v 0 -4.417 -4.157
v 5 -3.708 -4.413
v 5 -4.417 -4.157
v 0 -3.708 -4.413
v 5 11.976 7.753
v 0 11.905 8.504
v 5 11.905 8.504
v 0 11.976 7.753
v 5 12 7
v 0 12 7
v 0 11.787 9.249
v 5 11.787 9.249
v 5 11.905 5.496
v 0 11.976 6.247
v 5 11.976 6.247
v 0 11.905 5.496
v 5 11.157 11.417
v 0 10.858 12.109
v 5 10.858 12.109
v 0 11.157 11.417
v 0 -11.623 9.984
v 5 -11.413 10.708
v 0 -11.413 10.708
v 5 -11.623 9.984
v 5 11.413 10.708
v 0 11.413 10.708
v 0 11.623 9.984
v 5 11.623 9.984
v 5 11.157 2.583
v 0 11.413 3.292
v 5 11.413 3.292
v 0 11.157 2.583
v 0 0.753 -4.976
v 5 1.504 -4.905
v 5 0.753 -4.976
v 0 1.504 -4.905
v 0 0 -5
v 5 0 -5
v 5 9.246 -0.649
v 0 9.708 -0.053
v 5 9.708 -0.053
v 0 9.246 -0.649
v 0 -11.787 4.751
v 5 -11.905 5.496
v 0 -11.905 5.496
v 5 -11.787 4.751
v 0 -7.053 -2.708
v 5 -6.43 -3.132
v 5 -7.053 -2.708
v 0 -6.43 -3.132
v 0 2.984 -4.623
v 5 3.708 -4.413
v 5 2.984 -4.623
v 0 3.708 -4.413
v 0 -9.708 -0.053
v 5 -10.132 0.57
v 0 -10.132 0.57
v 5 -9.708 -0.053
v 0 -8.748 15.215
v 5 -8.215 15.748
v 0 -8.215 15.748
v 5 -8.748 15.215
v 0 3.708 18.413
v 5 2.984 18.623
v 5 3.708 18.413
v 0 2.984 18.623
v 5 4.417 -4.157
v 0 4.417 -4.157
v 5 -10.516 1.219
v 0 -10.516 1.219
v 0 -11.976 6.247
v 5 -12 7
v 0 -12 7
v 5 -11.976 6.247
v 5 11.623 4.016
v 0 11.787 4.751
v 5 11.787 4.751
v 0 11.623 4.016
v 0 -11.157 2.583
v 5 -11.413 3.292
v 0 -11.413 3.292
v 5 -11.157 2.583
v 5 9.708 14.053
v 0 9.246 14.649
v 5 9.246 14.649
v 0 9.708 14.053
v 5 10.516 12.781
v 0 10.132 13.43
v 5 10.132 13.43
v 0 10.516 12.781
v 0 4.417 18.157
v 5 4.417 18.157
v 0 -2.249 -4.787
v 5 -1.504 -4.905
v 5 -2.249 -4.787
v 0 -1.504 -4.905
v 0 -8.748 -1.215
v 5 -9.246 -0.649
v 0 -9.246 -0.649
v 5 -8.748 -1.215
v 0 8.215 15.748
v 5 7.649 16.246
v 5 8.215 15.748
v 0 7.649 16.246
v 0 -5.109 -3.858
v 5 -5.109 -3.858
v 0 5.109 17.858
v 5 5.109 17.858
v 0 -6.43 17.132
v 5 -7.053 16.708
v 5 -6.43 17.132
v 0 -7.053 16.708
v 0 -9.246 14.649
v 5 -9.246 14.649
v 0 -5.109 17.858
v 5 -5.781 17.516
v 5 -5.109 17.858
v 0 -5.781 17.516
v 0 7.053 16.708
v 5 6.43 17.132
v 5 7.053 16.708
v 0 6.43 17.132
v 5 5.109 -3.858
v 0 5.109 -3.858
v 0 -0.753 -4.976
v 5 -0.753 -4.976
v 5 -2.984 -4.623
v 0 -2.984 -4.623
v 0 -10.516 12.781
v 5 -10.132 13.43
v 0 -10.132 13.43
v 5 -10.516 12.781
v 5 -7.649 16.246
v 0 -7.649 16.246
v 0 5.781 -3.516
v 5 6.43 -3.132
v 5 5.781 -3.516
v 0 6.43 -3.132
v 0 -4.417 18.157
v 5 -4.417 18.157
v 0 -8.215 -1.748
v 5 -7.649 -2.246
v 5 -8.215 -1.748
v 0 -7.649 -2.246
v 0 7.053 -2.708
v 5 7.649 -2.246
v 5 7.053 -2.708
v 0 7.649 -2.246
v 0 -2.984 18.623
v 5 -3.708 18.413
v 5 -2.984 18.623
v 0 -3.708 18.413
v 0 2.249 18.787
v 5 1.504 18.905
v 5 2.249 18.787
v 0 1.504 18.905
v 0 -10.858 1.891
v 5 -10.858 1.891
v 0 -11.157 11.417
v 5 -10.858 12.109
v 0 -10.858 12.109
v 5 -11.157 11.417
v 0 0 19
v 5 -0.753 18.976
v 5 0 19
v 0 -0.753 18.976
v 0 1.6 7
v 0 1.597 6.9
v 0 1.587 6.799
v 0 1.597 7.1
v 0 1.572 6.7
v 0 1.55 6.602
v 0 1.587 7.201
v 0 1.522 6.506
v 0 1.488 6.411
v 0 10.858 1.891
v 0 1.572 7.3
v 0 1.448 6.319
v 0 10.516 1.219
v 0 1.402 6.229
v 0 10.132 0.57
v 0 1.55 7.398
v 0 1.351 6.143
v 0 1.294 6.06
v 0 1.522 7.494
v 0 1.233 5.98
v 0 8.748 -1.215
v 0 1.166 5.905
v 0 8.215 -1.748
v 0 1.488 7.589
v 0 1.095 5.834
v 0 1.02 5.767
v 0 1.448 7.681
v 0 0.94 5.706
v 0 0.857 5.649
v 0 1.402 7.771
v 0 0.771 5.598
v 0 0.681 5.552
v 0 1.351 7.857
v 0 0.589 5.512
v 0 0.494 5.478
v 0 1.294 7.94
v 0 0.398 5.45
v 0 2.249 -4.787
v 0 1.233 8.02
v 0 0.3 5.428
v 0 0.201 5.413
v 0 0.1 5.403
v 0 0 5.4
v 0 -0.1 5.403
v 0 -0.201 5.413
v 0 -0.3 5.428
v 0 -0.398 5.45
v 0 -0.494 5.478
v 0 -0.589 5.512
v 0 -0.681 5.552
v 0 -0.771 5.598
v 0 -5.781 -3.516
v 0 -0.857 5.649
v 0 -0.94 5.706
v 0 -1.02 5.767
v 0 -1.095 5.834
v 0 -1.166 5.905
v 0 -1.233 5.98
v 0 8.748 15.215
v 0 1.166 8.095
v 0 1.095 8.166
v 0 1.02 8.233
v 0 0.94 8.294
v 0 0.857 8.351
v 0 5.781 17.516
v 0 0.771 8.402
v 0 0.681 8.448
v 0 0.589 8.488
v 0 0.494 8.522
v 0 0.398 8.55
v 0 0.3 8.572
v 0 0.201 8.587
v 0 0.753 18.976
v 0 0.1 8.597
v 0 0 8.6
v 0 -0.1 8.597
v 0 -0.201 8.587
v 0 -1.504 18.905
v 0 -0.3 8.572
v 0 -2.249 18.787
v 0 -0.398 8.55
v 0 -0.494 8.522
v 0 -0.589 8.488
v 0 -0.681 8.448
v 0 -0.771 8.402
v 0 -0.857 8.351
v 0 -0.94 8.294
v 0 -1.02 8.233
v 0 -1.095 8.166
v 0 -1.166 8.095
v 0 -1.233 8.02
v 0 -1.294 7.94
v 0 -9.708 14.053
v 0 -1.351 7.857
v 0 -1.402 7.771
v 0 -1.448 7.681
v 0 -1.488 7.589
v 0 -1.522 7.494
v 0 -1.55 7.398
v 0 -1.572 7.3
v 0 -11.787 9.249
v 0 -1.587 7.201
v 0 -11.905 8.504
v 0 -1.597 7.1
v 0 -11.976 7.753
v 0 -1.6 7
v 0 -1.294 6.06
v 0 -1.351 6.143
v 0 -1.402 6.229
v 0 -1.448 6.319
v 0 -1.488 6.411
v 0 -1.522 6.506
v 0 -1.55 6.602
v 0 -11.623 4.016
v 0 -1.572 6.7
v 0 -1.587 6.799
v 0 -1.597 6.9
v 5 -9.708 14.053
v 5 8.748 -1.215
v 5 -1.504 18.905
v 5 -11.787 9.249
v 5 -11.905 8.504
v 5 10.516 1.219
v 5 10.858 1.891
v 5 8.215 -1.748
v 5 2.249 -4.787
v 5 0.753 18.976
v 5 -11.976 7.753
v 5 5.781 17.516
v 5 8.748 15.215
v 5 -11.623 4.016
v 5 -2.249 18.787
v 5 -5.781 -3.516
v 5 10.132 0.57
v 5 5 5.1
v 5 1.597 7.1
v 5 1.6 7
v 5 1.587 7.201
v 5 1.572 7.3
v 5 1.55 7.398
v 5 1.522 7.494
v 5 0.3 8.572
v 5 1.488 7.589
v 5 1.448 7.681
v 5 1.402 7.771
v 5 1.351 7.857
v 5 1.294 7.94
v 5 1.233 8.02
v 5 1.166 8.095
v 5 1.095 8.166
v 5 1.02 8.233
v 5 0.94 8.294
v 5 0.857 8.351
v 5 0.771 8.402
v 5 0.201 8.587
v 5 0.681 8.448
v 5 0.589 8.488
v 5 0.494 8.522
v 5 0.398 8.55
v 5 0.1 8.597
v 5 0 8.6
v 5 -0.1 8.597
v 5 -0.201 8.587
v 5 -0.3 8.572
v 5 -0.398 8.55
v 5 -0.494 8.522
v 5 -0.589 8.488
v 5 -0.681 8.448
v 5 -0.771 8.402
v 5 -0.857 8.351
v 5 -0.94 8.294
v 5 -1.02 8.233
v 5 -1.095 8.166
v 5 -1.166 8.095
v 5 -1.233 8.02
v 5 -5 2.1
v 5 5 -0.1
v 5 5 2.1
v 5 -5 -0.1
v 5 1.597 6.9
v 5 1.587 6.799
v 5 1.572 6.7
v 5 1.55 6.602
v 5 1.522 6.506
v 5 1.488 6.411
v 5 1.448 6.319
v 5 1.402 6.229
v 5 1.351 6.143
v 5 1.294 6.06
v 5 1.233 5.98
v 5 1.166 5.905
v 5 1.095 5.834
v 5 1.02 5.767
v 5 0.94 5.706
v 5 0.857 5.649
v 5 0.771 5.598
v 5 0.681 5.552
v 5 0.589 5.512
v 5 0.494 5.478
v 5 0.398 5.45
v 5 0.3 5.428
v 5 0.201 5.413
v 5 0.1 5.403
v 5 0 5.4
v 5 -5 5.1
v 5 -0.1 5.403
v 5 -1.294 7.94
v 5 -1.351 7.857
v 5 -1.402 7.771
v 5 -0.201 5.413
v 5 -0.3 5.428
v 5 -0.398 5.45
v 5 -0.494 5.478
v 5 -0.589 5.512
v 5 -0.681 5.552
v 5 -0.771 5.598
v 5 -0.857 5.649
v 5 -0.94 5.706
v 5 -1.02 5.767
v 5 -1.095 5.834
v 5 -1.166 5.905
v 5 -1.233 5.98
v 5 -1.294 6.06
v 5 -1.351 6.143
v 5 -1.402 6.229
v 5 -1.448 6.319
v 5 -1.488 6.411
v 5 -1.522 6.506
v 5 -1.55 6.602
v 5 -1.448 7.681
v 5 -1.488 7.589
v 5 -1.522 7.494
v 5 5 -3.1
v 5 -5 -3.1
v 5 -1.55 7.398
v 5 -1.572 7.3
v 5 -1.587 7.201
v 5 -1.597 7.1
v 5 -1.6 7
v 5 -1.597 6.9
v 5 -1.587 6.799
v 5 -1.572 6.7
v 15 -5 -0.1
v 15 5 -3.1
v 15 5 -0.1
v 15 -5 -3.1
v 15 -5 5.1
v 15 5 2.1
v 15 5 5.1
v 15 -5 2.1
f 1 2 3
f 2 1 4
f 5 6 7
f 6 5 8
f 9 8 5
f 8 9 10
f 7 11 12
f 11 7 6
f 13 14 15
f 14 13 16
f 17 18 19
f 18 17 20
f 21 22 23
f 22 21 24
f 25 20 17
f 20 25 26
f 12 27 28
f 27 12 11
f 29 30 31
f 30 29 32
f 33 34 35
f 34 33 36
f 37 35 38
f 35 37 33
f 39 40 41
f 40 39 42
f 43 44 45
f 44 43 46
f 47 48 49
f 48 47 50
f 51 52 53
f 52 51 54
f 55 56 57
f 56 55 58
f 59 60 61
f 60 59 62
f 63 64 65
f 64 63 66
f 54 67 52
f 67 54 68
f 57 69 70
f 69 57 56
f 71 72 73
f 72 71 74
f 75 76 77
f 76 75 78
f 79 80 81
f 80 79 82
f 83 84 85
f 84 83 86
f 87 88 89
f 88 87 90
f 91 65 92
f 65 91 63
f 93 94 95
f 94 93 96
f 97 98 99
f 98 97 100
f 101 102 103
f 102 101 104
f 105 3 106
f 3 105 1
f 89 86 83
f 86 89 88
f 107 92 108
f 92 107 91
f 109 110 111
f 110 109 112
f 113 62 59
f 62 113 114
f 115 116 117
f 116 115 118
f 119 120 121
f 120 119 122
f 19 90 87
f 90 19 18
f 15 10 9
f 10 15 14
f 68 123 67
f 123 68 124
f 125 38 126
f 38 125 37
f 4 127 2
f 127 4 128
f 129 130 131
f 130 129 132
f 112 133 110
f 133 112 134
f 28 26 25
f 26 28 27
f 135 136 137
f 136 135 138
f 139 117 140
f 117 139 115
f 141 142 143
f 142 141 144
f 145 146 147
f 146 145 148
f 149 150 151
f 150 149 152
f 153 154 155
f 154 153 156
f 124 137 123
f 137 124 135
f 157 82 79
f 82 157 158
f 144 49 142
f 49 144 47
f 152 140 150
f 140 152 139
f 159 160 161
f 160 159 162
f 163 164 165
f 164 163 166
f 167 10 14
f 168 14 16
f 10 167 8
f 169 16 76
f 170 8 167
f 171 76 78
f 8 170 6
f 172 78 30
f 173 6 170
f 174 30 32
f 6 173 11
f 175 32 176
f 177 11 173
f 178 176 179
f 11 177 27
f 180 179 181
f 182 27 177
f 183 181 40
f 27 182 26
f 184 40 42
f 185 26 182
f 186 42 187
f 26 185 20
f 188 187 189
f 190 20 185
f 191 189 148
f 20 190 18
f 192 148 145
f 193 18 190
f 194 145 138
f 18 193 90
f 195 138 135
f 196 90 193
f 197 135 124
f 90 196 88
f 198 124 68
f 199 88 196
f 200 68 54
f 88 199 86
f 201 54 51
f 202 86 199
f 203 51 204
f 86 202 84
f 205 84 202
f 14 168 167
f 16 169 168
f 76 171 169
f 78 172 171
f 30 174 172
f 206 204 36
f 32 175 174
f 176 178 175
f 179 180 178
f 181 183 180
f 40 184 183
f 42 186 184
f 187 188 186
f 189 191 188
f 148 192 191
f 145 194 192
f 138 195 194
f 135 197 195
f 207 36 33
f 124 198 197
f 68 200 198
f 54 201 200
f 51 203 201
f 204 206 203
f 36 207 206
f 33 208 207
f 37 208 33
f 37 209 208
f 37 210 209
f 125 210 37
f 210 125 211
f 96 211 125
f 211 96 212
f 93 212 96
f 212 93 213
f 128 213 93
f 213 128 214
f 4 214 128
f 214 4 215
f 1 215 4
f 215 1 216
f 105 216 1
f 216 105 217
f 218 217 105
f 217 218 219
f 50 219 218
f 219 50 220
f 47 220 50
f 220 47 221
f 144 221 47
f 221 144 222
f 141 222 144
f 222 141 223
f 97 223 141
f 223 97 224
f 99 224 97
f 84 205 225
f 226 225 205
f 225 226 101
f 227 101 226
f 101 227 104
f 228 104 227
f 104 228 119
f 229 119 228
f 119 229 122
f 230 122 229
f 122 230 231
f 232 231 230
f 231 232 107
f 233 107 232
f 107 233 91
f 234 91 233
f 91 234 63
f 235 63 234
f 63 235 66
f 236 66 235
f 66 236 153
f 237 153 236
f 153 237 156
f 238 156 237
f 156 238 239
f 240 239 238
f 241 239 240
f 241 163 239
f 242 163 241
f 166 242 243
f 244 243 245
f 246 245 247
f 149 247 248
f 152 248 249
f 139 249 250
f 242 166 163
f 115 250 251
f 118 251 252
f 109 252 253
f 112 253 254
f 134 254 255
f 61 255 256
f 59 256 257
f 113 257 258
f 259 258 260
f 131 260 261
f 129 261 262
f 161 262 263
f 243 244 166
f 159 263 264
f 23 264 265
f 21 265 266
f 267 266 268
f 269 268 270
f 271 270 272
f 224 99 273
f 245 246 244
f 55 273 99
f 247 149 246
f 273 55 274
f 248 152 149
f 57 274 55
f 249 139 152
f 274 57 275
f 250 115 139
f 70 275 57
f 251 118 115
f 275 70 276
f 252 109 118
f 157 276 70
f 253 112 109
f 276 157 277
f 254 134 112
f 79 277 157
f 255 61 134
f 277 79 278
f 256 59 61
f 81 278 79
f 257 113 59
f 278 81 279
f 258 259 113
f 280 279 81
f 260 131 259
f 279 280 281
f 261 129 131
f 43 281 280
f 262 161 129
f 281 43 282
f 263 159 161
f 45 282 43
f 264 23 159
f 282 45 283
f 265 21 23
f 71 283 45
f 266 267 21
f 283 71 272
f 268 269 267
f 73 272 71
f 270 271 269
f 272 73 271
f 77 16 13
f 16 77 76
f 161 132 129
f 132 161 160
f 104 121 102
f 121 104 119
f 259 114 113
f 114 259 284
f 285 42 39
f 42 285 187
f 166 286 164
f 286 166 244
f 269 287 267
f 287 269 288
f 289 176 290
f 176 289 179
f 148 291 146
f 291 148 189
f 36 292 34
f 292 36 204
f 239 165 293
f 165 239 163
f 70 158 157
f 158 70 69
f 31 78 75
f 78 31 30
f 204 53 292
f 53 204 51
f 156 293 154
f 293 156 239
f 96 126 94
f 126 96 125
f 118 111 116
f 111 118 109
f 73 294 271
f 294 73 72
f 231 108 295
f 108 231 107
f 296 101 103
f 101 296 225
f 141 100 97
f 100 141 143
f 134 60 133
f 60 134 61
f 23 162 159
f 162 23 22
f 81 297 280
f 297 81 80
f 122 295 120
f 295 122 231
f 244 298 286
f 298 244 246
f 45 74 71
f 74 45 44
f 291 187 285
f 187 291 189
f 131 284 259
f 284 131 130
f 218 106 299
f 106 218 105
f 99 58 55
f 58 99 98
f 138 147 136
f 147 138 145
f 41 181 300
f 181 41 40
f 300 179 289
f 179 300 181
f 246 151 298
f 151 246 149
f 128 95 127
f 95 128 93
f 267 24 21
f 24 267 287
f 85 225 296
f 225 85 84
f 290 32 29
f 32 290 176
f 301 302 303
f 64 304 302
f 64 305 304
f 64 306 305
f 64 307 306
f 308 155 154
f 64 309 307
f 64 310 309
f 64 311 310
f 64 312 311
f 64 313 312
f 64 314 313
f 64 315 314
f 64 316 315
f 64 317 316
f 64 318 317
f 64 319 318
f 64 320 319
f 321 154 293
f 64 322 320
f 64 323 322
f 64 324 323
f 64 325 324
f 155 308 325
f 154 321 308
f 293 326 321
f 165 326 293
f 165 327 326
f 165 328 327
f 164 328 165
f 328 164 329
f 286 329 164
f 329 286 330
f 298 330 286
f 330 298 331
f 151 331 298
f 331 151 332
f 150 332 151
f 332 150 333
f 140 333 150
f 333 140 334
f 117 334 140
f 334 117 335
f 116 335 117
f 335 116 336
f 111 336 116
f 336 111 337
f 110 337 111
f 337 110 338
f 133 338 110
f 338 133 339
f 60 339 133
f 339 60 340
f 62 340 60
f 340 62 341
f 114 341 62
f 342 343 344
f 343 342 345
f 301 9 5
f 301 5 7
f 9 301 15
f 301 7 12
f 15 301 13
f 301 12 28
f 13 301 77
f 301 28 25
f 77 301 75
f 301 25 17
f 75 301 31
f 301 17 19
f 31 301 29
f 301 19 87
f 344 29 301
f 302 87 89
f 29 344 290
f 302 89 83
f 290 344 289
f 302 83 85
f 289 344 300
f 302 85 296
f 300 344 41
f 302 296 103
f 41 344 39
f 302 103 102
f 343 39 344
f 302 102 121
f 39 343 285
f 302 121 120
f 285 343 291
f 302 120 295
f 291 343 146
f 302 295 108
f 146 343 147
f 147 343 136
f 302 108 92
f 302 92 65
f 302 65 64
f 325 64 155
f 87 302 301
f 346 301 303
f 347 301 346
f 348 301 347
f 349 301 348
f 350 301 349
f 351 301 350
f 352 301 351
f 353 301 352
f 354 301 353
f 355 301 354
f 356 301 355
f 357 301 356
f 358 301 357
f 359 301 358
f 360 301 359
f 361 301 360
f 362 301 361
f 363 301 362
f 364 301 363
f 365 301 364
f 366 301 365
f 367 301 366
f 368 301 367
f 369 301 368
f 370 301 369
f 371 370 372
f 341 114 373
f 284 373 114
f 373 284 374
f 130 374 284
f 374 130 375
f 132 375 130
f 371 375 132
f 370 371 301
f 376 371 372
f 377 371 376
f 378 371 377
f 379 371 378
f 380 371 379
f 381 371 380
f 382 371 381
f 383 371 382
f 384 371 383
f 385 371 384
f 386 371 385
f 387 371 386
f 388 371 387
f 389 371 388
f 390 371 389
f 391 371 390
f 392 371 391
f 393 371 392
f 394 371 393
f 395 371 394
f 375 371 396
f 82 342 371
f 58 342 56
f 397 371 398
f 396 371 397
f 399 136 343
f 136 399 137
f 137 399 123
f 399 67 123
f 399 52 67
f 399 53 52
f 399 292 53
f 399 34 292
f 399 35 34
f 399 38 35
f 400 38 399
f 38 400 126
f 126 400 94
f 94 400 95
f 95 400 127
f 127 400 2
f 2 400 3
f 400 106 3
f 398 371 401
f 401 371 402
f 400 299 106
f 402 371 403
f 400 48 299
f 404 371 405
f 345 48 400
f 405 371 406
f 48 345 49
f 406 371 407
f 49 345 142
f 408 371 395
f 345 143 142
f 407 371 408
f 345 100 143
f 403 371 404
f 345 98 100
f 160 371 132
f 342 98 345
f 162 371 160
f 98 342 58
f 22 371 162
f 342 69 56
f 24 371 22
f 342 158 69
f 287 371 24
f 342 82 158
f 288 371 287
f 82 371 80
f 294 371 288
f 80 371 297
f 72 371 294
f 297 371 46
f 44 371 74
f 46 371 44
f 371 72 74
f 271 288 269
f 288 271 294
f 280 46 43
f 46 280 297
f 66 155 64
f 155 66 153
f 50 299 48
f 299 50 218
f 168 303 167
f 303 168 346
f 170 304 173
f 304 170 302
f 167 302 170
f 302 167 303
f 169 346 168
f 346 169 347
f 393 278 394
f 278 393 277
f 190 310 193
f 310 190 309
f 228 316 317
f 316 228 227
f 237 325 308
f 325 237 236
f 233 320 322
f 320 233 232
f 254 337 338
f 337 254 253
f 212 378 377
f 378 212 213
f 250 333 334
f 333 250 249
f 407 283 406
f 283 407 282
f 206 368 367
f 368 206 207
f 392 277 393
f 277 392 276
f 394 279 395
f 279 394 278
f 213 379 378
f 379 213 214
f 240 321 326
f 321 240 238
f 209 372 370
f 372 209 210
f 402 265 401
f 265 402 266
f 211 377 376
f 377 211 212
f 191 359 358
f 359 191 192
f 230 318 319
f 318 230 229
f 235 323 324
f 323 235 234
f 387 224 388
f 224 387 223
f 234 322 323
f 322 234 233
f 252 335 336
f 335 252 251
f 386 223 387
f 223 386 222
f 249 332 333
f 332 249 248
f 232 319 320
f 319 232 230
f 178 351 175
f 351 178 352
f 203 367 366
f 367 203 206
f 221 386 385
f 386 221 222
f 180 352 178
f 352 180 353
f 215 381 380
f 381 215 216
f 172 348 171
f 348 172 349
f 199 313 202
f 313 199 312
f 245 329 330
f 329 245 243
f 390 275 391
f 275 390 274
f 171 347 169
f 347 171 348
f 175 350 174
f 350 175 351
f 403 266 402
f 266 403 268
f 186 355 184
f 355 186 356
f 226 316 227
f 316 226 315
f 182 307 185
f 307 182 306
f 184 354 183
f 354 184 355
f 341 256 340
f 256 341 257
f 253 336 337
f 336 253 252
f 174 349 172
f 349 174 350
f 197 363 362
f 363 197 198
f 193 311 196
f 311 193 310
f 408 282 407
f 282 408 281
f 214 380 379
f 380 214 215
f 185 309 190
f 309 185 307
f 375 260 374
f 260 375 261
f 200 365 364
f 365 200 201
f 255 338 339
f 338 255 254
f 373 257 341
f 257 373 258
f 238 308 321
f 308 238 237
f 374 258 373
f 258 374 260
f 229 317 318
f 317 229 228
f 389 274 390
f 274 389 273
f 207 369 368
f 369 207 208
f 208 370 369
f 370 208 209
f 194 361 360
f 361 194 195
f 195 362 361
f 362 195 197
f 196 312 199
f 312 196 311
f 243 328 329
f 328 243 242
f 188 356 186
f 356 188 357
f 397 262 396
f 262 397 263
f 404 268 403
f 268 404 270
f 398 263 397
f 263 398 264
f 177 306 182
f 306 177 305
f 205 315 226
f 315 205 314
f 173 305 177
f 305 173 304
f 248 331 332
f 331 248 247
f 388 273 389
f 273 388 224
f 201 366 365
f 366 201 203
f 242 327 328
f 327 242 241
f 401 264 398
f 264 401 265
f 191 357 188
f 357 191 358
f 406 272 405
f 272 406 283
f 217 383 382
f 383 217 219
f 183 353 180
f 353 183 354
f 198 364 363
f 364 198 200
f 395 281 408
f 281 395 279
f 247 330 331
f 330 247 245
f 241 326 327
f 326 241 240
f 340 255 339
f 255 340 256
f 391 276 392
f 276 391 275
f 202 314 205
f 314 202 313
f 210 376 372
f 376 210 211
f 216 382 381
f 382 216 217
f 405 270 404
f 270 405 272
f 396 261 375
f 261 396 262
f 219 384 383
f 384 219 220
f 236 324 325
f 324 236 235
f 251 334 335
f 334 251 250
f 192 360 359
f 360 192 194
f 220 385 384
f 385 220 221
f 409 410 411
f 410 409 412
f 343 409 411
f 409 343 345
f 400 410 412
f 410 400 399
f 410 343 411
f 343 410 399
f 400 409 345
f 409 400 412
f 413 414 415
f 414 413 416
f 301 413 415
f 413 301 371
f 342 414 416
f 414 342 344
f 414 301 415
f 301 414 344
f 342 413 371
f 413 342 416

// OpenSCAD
module test_wheel(){
    translate([0,0,7]){
        r_wheel = 12;
        $fn=100;
        color("Gray"){
            rotate([90,0,90]){
                difference(){
                    cylinder(5,r_wheel,r_wheel);
                    translate([0,0,-1]){
                        cylinder(7,1.6,1.6);
                    }
                }
            }
        }
    }
    color("DimGray"){
        translate([5,-5,-3.1]){
            cube([10,10,3]);
        }
        translate([5,-5,2.1]){
            cube([10,10,3]);
        }
    }
}
test_wheel();
